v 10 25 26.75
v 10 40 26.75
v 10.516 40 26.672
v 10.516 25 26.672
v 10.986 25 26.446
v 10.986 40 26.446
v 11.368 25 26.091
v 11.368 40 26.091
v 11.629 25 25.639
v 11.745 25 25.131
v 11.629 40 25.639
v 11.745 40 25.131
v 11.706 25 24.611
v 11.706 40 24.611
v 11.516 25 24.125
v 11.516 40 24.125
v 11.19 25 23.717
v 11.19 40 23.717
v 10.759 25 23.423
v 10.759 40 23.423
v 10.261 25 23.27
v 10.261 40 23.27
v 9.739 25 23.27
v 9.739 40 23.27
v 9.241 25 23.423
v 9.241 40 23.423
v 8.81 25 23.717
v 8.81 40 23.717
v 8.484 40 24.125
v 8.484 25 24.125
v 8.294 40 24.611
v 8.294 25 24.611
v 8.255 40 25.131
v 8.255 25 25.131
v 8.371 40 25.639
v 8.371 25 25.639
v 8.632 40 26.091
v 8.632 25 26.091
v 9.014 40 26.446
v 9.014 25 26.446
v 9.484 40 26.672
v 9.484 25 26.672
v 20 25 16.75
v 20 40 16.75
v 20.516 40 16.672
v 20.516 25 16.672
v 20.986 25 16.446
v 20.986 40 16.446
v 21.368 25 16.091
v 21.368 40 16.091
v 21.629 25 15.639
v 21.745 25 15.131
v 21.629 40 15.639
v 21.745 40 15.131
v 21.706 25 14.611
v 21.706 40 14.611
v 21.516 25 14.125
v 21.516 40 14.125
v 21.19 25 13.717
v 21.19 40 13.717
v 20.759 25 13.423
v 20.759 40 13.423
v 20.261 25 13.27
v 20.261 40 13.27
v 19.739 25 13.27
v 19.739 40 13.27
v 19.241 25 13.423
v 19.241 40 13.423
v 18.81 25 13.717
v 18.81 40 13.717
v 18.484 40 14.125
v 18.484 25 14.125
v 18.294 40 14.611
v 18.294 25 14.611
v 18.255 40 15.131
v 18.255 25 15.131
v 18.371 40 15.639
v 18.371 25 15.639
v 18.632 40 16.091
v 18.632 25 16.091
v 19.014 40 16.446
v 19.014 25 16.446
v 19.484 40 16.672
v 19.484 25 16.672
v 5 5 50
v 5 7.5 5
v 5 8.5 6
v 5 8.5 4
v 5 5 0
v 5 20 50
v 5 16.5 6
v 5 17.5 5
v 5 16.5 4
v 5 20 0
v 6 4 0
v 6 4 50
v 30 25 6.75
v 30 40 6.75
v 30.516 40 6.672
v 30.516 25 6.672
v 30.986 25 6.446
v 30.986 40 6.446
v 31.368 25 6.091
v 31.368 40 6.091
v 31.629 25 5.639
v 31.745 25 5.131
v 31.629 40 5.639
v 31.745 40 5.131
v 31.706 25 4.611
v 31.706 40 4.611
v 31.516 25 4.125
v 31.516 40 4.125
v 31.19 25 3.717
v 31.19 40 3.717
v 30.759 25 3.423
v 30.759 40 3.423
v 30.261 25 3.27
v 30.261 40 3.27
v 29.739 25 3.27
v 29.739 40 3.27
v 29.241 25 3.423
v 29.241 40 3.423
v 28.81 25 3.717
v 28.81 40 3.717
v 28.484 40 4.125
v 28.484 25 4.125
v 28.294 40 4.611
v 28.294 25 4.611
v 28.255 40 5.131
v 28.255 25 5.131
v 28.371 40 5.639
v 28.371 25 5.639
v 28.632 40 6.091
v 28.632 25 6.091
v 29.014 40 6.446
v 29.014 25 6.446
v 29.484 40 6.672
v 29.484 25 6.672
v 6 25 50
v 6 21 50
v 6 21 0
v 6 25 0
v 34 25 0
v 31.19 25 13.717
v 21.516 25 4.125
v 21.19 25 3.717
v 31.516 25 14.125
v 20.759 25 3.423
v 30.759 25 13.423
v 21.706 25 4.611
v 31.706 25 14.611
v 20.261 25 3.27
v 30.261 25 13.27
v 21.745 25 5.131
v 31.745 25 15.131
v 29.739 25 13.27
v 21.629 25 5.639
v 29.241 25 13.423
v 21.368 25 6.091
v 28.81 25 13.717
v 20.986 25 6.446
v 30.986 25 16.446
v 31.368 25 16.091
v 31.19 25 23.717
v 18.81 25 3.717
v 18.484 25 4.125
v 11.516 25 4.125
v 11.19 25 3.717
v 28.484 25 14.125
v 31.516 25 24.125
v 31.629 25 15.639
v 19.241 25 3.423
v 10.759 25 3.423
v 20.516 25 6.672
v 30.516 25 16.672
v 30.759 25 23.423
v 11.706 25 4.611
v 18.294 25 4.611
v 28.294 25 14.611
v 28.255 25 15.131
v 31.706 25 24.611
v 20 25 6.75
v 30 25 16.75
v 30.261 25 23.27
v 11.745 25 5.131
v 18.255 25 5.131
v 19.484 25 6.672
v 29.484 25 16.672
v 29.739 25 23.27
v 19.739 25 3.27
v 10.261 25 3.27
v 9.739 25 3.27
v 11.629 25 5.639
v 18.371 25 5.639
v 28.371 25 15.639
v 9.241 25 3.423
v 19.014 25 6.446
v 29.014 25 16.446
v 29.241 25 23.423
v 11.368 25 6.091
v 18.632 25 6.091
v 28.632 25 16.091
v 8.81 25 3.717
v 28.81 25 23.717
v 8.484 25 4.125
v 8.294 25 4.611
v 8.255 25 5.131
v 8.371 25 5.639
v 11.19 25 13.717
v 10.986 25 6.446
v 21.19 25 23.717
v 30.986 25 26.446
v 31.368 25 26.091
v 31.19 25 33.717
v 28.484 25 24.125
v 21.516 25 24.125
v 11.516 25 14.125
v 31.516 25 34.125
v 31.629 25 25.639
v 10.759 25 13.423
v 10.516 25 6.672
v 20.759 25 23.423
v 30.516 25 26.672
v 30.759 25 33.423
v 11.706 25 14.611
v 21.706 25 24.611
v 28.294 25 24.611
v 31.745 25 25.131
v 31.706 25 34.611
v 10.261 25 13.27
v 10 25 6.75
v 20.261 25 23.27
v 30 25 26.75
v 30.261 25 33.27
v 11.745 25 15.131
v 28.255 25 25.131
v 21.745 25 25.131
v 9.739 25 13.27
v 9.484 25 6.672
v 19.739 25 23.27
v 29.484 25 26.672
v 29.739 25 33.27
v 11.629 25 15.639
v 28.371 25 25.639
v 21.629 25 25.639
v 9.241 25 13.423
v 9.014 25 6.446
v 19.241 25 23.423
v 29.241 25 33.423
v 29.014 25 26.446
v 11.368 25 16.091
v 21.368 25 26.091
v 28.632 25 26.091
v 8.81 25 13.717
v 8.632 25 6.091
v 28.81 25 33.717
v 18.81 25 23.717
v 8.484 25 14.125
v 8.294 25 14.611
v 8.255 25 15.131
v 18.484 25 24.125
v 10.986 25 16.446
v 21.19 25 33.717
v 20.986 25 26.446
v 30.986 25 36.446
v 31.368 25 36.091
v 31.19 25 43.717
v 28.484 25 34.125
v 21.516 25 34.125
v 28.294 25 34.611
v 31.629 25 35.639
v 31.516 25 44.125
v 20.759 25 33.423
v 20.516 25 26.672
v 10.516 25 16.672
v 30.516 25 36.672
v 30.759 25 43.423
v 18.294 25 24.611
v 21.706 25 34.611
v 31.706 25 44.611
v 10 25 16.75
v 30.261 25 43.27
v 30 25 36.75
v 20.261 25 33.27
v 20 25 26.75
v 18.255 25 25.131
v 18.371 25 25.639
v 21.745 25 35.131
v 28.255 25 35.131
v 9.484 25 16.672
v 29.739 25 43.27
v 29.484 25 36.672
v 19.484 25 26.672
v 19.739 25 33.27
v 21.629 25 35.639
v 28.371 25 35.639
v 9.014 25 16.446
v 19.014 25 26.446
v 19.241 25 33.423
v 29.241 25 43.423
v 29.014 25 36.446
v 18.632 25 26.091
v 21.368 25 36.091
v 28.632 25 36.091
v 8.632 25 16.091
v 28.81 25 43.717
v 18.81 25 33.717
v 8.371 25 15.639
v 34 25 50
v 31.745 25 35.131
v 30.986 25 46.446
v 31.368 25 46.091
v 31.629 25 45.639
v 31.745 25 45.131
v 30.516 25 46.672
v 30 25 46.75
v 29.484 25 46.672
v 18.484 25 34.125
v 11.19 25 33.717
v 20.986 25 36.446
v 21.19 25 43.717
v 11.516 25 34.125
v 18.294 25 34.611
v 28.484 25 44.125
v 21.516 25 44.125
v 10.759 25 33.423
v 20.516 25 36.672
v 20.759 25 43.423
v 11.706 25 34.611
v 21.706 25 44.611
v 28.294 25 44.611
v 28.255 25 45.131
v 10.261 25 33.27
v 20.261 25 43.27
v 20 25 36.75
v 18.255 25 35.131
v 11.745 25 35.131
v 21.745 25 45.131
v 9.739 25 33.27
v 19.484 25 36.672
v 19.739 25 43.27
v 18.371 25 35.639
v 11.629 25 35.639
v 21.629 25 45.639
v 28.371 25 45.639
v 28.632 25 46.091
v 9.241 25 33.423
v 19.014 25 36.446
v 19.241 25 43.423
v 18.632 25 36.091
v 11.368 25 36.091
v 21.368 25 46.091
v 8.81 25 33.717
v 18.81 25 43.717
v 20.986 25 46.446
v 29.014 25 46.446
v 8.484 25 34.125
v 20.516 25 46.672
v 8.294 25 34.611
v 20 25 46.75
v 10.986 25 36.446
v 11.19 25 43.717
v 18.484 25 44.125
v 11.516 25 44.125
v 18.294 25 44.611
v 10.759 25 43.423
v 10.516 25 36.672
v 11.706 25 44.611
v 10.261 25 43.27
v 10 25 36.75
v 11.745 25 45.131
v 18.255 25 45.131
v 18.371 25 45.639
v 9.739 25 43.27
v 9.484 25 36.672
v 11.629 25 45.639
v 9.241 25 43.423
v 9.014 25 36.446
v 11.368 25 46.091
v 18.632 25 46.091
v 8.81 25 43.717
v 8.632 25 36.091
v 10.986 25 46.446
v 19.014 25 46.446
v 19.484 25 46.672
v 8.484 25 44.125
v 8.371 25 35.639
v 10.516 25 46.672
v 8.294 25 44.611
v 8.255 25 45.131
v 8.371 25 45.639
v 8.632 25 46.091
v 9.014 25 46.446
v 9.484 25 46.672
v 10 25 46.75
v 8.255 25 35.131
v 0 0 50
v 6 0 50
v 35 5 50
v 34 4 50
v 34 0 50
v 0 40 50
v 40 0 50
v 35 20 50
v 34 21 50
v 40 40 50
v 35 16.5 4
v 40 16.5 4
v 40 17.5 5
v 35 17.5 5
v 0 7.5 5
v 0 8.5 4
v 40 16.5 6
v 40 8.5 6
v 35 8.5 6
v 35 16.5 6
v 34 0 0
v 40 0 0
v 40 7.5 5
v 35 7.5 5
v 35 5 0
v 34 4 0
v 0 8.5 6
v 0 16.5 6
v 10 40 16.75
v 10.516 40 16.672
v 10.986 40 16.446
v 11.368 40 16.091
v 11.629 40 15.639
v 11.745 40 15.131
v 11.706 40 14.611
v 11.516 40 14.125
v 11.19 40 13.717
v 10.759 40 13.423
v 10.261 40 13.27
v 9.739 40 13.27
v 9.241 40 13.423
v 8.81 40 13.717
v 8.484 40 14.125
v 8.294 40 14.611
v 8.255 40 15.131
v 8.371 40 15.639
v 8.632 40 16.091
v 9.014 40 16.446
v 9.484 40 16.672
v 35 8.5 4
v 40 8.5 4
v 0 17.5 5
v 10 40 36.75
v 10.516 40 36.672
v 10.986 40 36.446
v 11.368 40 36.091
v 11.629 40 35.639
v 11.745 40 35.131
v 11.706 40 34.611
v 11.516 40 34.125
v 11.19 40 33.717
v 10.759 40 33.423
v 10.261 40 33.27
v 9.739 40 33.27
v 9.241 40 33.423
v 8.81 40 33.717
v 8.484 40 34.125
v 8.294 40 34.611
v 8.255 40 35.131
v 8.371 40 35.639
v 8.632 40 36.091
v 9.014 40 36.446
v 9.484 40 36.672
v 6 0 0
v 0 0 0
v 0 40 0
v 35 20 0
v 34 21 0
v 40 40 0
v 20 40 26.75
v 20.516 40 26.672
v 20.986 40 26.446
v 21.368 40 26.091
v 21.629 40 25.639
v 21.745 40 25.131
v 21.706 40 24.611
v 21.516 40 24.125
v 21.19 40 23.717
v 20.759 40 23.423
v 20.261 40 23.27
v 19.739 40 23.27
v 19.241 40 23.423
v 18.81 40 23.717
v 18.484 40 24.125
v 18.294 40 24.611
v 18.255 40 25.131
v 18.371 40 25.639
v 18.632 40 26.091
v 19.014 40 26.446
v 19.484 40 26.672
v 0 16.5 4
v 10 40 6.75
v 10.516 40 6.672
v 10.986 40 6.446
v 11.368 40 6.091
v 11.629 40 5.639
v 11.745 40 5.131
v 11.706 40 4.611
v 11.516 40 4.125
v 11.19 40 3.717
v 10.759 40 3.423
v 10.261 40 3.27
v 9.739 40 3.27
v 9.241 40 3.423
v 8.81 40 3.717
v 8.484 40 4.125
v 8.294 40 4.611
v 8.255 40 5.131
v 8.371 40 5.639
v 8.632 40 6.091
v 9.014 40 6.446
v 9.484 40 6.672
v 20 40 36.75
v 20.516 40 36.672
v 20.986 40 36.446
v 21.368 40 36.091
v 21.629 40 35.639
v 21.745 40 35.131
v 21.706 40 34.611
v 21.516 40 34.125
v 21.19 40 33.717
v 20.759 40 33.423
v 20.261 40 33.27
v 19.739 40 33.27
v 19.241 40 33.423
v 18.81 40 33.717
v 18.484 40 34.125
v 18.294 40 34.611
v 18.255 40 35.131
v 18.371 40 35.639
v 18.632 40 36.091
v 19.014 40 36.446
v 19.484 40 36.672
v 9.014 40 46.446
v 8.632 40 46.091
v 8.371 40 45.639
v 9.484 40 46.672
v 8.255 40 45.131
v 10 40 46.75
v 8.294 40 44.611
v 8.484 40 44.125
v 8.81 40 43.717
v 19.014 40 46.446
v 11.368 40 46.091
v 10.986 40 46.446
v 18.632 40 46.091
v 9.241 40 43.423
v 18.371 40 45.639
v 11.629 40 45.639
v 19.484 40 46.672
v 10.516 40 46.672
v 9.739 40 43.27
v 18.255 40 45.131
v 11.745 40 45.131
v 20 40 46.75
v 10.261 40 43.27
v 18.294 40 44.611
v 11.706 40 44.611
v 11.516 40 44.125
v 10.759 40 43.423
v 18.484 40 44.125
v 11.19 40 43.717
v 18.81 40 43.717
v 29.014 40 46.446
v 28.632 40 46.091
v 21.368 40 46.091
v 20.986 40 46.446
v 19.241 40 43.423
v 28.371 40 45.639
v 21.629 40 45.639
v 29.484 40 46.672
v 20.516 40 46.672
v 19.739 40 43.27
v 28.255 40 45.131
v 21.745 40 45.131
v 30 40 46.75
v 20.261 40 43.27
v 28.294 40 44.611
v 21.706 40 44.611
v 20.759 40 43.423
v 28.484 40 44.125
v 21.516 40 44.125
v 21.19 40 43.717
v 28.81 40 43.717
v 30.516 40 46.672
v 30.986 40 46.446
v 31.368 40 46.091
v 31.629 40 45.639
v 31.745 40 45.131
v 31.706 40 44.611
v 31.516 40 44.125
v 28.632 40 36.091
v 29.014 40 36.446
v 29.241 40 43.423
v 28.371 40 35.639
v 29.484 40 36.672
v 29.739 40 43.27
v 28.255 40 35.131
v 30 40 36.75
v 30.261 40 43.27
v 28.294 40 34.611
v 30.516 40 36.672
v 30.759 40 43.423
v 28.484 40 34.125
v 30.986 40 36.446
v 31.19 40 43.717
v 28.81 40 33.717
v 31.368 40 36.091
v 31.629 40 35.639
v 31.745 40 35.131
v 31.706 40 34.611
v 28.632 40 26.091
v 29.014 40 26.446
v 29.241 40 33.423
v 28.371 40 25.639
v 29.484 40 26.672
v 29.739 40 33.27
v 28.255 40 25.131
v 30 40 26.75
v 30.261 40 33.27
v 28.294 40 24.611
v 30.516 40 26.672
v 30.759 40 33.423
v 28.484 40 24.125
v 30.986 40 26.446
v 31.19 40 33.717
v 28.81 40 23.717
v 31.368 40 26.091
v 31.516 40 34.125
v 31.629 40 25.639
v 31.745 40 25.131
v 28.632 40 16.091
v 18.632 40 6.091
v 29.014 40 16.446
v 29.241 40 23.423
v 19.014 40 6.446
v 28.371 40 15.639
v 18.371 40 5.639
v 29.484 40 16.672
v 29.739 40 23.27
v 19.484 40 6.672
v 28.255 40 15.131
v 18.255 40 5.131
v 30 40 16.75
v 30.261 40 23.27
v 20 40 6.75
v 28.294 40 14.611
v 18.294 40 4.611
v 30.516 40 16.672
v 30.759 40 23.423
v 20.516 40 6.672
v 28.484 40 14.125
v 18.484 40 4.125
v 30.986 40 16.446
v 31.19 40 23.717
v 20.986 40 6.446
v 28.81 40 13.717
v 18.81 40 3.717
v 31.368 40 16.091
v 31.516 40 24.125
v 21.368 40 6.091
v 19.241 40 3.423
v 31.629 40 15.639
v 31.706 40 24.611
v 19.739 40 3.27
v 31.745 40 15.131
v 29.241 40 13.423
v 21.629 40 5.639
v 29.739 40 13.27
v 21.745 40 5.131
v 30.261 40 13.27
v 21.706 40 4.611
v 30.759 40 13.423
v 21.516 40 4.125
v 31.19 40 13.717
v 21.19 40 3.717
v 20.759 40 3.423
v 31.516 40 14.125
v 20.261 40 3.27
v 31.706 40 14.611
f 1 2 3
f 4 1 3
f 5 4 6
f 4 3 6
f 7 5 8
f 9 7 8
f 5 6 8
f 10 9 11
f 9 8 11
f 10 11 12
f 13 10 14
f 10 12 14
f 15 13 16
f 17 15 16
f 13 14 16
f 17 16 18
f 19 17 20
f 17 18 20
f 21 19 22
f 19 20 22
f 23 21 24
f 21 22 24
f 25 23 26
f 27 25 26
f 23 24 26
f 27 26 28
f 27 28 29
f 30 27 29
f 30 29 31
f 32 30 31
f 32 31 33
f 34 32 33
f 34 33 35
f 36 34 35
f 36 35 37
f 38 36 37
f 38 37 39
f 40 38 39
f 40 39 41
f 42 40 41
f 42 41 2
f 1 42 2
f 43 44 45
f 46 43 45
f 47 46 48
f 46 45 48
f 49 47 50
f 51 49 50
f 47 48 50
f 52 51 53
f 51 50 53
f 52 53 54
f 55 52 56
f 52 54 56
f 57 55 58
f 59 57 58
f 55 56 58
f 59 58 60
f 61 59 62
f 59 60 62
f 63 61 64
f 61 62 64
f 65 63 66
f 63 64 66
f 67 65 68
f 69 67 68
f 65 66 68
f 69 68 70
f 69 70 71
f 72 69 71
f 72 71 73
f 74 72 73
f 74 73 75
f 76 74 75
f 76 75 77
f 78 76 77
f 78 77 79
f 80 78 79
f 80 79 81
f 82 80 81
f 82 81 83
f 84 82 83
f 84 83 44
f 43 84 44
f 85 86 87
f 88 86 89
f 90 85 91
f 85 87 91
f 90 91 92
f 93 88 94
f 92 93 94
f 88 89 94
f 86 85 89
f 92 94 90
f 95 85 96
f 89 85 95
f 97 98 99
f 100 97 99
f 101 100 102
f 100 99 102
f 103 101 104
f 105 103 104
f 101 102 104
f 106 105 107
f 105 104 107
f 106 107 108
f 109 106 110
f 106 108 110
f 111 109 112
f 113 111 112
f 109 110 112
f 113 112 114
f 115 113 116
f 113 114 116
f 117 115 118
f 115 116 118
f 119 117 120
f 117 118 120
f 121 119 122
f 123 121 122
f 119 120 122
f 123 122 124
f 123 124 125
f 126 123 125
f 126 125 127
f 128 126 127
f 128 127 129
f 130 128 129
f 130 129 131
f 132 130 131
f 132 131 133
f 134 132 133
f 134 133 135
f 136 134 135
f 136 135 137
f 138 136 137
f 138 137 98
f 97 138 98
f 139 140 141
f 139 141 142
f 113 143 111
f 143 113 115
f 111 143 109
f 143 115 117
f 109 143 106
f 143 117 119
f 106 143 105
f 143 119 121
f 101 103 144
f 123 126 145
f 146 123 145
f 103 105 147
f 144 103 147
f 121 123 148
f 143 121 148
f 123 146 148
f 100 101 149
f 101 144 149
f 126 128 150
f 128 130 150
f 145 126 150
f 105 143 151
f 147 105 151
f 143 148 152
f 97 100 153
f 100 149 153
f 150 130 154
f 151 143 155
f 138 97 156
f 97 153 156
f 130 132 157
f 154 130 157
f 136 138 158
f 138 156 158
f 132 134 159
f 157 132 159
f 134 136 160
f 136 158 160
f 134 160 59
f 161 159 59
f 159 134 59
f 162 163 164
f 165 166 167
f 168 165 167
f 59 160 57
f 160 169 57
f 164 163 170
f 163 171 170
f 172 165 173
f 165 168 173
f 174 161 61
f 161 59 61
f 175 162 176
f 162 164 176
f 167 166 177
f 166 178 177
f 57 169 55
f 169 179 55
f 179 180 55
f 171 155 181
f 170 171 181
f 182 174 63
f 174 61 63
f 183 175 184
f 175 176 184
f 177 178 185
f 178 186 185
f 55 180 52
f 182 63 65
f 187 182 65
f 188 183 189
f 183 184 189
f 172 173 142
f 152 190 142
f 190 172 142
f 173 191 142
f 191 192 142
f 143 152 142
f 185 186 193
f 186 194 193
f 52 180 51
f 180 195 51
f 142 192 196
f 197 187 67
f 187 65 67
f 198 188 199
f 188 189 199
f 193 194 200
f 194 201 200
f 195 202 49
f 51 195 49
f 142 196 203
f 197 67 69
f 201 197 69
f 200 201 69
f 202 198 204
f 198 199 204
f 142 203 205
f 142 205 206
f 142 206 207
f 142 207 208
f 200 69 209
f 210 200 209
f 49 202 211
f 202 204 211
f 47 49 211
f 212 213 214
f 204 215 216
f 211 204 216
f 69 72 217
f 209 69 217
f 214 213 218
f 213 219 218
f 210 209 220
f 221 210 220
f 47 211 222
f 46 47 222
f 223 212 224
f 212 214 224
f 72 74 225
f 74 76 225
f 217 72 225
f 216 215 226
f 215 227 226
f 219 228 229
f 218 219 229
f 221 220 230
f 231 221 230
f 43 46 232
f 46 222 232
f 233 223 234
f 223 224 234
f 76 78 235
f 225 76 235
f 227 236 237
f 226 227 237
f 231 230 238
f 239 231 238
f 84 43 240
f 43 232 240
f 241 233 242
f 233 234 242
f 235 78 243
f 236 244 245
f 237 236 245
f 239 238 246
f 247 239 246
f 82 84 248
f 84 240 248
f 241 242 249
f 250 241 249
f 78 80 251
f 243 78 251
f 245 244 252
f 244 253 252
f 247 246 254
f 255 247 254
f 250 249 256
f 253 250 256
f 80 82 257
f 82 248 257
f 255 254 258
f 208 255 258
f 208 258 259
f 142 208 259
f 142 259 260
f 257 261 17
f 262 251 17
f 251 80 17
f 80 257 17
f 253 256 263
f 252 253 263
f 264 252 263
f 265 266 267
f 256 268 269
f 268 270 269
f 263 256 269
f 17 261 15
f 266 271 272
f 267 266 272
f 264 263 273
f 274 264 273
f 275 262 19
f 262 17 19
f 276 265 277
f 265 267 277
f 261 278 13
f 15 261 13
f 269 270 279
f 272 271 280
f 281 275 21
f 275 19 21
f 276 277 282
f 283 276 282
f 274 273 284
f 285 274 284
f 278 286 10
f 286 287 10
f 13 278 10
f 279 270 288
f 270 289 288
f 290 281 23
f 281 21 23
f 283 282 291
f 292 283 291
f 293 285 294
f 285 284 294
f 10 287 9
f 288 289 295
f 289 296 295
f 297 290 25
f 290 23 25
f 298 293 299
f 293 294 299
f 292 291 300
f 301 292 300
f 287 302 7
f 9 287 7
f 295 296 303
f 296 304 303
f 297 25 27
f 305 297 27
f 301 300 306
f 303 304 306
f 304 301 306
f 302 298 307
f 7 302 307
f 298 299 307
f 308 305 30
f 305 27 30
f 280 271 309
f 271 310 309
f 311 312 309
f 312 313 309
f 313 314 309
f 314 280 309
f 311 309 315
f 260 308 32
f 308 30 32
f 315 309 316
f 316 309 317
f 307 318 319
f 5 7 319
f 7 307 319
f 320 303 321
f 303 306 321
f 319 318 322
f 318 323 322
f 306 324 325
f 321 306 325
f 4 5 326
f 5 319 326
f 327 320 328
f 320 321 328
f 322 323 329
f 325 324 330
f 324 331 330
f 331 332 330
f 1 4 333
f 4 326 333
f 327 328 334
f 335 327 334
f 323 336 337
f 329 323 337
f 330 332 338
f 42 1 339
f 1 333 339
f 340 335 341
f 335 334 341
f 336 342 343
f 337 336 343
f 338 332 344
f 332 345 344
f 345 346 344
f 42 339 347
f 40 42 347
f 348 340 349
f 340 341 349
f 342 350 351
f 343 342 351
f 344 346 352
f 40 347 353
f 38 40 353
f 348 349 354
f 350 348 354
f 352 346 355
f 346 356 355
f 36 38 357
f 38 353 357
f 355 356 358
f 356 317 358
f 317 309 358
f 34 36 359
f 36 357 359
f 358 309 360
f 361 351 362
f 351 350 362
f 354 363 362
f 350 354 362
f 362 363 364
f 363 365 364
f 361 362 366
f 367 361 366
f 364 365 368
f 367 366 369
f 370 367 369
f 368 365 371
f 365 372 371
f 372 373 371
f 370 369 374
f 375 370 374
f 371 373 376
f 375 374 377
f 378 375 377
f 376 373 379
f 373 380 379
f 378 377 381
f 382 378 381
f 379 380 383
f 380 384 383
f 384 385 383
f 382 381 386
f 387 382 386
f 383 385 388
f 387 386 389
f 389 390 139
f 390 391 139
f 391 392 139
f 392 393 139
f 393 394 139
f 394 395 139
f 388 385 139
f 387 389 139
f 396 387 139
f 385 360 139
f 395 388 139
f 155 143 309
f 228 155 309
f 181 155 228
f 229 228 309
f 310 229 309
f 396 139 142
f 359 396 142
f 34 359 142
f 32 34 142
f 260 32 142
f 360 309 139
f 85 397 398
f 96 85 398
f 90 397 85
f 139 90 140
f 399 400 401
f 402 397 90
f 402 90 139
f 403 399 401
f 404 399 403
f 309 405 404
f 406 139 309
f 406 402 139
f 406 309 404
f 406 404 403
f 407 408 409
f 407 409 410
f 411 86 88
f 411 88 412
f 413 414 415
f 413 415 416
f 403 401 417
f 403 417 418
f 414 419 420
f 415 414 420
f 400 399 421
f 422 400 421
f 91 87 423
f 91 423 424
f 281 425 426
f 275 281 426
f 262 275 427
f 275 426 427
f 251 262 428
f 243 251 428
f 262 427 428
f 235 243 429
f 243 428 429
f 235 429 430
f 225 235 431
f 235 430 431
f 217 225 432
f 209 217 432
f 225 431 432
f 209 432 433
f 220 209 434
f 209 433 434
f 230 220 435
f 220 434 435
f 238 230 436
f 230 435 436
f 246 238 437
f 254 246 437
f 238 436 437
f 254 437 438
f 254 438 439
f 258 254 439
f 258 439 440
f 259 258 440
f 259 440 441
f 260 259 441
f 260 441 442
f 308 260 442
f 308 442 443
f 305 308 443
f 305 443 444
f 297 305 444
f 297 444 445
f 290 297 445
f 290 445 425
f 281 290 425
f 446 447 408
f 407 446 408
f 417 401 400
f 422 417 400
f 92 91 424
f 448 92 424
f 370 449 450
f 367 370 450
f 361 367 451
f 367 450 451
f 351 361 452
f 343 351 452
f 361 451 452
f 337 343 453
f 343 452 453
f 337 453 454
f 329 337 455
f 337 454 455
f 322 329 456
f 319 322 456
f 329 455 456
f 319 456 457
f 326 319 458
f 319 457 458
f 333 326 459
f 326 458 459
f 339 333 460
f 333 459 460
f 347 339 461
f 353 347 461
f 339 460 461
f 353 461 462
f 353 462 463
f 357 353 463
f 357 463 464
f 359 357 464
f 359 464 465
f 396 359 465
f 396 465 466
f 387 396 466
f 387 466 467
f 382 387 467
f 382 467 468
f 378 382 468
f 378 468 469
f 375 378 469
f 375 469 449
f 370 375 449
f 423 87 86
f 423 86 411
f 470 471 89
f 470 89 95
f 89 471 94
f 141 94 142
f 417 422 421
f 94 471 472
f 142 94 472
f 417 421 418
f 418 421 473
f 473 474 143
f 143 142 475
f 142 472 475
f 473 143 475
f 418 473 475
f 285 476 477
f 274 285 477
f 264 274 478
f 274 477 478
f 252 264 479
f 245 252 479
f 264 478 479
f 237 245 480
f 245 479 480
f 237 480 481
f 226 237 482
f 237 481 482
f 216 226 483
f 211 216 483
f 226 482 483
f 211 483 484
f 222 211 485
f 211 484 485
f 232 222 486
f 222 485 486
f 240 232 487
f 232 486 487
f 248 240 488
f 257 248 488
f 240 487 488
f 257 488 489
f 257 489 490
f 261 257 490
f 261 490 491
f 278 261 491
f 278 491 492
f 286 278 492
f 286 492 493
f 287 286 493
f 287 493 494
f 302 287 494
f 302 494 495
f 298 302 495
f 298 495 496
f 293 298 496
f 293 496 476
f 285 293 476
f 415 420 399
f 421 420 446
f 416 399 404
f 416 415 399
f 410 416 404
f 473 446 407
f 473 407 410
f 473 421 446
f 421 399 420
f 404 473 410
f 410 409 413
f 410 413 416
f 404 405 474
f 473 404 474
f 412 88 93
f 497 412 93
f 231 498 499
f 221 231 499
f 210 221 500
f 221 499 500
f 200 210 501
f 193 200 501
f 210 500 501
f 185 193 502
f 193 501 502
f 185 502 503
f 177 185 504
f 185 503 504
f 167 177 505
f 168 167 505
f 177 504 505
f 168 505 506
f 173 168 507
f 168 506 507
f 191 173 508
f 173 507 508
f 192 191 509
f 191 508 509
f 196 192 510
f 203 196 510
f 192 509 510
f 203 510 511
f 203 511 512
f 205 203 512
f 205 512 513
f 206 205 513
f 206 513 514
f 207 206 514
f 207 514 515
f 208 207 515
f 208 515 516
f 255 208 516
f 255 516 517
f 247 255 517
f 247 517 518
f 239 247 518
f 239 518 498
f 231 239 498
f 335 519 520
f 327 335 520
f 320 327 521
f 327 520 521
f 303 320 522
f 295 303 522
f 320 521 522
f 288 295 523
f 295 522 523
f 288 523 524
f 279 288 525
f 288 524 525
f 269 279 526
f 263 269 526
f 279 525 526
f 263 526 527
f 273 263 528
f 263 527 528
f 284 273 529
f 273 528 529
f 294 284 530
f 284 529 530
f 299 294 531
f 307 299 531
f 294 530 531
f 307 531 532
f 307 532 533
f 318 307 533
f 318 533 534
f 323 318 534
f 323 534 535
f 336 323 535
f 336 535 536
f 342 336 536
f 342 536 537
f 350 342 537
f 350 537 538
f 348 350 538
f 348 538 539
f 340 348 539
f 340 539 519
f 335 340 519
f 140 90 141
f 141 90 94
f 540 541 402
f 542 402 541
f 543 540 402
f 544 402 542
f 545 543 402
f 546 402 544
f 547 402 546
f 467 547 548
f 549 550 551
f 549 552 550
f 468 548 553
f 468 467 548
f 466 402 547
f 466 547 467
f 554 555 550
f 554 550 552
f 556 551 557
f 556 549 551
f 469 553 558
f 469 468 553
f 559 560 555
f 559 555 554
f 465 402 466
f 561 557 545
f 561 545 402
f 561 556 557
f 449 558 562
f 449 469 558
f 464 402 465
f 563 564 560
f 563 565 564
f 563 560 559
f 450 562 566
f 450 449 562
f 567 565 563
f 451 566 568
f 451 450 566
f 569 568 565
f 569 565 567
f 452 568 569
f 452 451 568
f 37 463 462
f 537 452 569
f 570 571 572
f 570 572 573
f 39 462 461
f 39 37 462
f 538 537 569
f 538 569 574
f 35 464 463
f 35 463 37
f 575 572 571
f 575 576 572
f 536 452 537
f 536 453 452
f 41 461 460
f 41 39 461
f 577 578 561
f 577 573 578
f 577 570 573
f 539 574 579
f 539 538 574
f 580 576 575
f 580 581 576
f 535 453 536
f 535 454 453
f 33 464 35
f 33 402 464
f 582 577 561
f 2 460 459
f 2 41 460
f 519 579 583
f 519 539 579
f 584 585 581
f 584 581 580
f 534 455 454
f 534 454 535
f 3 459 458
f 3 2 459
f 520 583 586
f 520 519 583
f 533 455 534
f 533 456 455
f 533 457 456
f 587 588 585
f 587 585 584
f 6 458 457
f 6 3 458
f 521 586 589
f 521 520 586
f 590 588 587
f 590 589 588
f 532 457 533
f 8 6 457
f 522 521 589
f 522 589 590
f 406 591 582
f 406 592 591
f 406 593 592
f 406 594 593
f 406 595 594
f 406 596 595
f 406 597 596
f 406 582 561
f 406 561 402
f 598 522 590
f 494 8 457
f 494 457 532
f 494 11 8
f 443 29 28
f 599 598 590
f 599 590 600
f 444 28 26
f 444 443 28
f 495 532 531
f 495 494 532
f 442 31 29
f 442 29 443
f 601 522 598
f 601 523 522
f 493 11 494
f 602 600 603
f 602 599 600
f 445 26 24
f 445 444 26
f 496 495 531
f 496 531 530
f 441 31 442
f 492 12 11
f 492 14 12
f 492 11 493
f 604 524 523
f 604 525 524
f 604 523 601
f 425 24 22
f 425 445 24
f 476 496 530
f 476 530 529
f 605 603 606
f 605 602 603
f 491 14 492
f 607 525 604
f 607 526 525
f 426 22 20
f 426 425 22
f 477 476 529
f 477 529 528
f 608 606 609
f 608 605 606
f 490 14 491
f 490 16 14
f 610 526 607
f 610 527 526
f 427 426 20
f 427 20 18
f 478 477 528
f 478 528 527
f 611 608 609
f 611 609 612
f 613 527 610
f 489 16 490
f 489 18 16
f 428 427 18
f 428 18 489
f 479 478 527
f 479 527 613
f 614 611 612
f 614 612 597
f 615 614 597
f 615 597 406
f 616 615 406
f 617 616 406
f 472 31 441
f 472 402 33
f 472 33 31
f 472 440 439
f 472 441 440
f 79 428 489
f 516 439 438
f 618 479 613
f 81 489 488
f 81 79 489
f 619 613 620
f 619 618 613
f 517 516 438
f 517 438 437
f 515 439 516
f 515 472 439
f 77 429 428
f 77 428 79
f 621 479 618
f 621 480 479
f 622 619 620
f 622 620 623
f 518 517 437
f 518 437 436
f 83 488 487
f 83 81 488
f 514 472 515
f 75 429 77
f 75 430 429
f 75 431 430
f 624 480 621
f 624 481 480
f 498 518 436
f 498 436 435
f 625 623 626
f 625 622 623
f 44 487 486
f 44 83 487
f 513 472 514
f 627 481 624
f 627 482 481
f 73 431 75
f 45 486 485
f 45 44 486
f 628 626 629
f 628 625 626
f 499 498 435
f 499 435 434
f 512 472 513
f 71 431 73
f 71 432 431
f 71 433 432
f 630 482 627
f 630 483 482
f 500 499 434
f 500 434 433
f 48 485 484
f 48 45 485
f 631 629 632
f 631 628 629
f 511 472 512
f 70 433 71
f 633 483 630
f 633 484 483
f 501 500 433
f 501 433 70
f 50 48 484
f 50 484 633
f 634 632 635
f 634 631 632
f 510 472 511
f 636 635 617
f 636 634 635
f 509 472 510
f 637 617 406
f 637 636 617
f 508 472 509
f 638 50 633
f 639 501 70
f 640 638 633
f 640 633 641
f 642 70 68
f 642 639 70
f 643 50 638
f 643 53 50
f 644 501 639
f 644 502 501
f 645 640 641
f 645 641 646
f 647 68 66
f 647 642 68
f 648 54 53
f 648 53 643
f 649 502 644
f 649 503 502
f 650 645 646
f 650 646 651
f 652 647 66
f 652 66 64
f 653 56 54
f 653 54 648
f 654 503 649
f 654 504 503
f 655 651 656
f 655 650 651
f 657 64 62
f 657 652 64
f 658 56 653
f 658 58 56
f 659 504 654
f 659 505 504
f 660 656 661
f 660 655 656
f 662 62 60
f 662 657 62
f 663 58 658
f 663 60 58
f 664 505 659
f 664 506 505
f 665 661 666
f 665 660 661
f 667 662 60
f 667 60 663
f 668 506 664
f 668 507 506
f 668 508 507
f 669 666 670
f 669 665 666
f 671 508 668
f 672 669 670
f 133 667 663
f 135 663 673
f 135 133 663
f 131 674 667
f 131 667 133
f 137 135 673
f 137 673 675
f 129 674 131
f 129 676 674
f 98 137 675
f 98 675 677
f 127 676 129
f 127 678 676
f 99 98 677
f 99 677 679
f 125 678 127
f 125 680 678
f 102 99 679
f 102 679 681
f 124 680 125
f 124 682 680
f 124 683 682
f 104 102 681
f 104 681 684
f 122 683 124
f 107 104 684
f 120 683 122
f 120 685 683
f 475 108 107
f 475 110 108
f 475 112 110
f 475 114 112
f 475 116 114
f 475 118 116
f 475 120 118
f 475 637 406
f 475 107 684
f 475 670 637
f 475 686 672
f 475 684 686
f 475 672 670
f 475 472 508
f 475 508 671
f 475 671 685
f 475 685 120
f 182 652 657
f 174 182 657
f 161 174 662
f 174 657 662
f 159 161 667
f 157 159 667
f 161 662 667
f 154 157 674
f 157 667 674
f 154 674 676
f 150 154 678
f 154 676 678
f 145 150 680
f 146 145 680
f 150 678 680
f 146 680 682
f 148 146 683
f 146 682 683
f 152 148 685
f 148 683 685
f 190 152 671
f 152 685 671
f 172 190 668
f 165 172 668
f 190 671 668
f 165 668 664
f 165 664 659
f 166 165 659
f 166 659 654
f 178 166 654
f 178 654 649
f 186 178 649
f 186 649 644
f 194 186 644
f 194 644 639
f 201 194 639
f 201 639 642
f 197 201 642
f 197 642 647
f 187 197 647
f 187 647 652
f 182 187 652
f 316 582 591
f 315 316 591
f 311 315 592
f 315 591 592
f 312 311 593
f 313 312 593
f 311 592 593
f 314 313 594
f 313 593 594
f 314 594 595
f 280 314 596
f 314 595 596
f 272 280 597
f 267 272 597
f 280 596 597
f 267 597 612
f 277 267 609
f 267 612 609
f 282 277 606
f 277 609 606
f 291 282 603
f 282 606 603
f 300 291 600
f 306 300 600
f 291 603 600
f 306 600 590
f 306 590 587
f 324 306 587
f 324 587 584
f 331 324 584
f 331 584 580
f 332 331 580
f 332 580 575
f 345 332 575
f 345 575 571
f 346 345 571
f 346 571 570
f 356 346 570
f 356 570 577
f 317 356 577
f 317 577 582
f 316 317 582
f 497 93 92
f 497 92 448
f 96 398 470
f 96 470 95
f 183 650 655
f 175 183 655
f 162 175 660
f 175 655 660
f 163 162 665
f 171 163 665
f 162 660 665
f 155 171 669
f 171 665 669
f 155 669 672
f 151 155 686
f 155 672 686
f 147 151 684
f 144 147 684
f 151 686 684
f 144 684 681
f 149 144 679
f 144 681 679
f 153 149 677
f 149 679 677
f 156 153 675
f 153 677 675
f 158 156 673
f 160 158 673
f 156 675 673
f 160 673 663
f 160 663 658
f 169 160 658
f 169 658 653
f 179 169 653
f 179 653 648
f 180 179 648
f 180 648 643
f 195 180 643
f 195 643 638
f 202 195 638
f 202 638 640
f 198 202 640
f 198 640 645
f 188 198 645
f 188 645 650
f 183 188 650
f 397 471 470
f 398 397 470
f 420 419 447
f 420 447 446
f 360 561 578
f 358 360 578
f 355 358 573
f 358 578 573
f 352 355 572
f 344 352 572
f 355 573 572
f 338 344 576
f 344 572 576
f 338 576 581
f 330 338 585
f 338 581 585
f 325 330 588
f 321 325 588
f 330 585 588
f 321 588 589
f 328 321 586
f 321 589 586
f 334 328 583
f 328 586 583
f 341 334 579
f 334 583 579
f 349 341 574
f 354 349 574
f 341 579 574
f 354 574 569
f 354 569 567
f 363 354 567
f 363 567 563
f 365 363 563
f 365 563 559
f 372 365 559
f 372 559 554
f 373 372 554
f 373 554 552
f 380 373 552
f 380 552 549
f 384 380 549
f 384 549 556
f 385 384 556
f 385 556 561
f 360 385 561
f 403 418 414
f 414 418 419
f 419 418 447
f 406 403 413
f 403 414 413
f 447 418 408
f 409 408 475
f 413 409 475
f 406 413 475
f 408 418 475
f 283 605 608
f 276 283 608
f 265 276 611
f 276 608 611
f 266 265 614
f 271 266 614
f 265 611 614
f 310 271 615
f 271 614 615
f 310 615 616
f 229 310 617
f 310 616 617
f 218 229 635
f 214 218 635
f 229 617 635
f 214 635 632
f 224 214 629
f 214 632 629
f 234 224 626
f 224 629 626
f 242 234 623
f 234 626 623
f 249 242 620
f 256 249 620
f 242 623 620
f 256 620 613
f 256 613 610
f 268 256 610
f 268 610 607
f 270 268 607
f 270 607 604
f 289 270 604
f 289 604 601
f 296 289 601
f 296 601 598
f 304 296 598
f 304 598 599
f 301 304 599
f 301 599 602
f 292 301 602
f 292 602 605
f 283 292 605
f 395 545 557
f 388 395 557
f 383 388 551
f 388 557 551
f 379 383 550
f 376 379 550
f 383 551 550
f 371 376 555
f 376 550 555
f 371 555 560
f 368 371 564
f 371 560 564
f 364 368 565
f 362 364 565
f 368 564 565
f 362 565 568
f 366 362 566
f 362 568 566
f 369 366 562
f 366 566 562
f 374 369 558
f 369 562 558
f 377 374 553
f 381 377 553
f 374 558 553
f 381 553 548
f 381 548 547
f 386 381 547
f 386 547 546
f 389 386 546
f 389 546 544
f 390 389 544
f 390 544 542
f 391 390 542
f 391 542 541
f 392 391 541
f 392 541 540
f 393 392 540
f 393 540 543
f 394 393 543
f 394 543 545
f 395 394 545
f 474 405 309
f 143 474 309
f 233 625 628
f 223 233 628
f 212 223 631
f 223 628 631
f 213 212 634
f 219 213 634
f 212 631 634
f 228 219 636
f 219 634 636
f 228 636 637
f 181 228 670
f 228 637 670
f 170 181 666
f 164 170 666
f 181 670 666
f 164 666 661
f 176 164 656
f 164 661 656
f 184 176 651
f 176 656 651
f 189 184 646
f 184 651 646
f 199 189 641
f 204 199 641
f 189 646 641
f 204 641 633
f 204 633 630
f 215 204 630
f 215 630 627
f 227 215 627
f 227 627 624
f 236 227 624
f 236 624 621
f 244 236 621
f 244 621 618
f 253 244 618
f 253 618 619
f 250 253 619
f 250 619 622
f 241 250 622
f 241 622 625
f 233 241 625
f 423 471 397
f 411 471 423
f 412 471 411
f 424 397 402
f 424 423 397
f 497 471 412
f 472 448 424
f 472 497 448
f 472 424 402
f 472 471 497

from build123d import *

# Parameters (mm, degrees)
SKETCH_1_W          = 40
SKETCH_1_H          = 40
SKETCH_1_W_2        = 30
SKETCH_1_H_2        = 15
EXTRUDE_1_DEPTH     = 50
CUT_EXTRUDE_START   = -50
SKETCH_3_W          = 28
SKETCH_3_H          = 25
CUT_EXTRUDE_1_DEPTH = 50
CHAMFER_1_SIZE      = 1
CUT_EXTRUDE_2_REACH = 77.498
SKETCH_4_R          = 1.75
SKETCH_5_W          = 2
SKETCH_5_H          = 10
CUT_EXTRUDE_4_DEPTH = 76.498344353
CHAMFER_3_SIZE      = 1


with BuildPart() as part:
    # ｽｹｯﾁ1 → ﾎﾞｽ - 押し出し1 (new body)
    with BuildSketch(Plane.XY):
        with Locations((20, 20)):
            Rectangle(SKETCH_1_W, SKETCH_1_H)
        with Locations((20, 12.5)):
            Rectangle(SKETCH_1_W_2, SKETCH_1_H_2, mode=Mode.SUBTRACT)
    extrude(amount=EXTRUDE_1_DEPTH)

    # ｽｹｯﾁ3 → ｶｯﾄ - 押し出し1 (cut)
    with BuildSketch(Plane(origin=(0, 0, 0), x_dir=(-1, 0, 0), z_dir=(0, 0, -1)).offset(CUT_EXTRUDE_START)):
        with Locations((-20, 12.5)):
            Rectangle(SKETCH_3_W, SKETCH_3_H)
    extrude(amount=CUT_EXTRUDE_1_DEPTH, mode=Mode.SUBTRACT)

    # 面取り1
    chamfer_1_edges = [part.edges().sort_by_distance(p)[0] for p in [
        (6, 20, 25),
        (6, 5, 25),
        (34, 5, 25),
        (34, 20, 25),
    ]]
    chamfer(chamfer_1_edges, length=CHAMFER_1_SIZE - 0.0001)  # a hair under: the kernel refuses the full size

    # ｽｹｯﾁ4 → ｶｯﾄ - 押し出し2 (cut, up to next)
    with BuildSketch(Plane(origin=(0, 40, 0), x_dir=(1, 0, 0), z_dir=(0, 1, 0)), mode=Mode.PRIVATE) as cut_extrude_2_sk1:
        with Locations(Location((10, -5, 0), (0, 0, 270))):
            Circle(SKETCH_4_R)
    cut_extrude_2_tool1 = extrude(cut_extrude_2_sk1.sketch, amount=-CUT_EXTRUDE_2_REACH, mode=Mode.PRIVATE) & part.part
    # ｽｹｯﾁ4 → ｶｯﾄ - 押し出し2 (cut, up to next)
    with BuildSketch(Plane(origin=(0, 40, 0), x_dir=(1, 0, 0), z_dir=(0, 1, 0)), mode=Mode.PRIVATE) as cut_extrude_2_sk2:
        with Locations(Location((20, -5, 0), (0, 0, 270))):
            Circle(SKETCH_4_R)
    cut_extrude_2_tool2 = extrude(cut_extrude_2_sk2.sketch, amount=-CUT_EXTRUDE_2_REACH, mode=Mode.PRIVATE) & part.part
    # ｽｹｯﾁ4 → ｶｯﾄ - 押し出し2 (cut, up to next)
    with BuildSketch(Plane(origin=(0, 40, 0), x_dir=(1, 0, 0), z_dir=(0, 1, 0)), mode=Mode.PRIVATE) as cut_extrude_2_sk3:
        with Locations(Location((30, -5, 0), (0, 0, 270))):
            Circle(SKETCH_4_R)
    cut_extrude_2_tool3 = extrude(cut_extrude_2_sk3.sketch, amount=-CUT_EXTRUDE_2_REACH, mode=Mode.PRIVATE) & part.part
    # ｽｹｯﾁ4 → ｶｯﾄ - 押し出し2 (cut, up to next)
    with BuildSketch(Plane(origin=(0, 40, 0), x_dir=(1, 0, 0), z_dir=(0, 1, 0)), mode=Mode.PRIVATE) as cut_extrude_2_sk4:
        with Locations(Location((10, -15, 0), (0, 0, 270))):
            Circle(SKETCH_4_R)
    cut_extrude_2_tool4 = extrude(cut_extrude_2_sk4.sketch, amount=-CUT_EXTRUDE_2_REACH, mode=Mode.PRIVATE) & part.part
    # ｽｹｯﾁ4 → ｶｯﾄ - 押し出し2 (cut, up to next)
    with BuildSketch(Plane(origin=(0, 40, 0), x_dir=(1, 0, 0), z_dir=(0, 1, 0)), mode=Mode.PRIVATE) as cut_extrude_2_sk5:
        with Locations(Location((20, -15, 0), (0, 0, 270))):
            Circle(SKETCH_4_R)
    cut_extrude_2_tool5 = extrude(cut_extrude_2_sk5.sketch, amount=-CUT_EXTRUDE_2_REACH, mode=Mode.PRIVATE) & part.part
    # ｽｹｯﾁ4 → ｶｯﾄ - 押し出し2 (cut, up to next)
    with BuildSketch(Plane(origin=(0, 40, 0), x_dir=(1, 0, 0), z_dir=(0, 1, 0)), mode=Mode.PRIVATE) as cut_extrude_2_sk6:
        with Locations(Location((30, -15, 0), (0, 0, 270))):
            Circle(SKETCH_4_R)
    cut_extrude_2_tool6 = extrude(cut_extrude_2_sk6.sketch, amount=-CUT_EXTRUDE_2_REACH, mode=Mode.PRIVATE) & part.part
    # ｽｹｯﾁ4 → ｶｯﾄ - 押し出し2 (cut, up to next)
    with BuildSketch(Plane(origin=(0, 40, 0), x_dir=(1, 0, 0), z_dir=(0, 1, 0)), mode=Mode.PRIVATE) as cut_extrude_2_sk7:
        with Locations(Location((10, -25, 0), (0, 0, 270))):
            Circle(SKETCH_4_R)
    cut_extrude_2_tool7 = extrude(cut_extrude_2_sk7.sketch, amount=-CUT_EXTRUDE_2_REACH, mode=Mode.PRIVATE) & part.part
    # ｽｹｯﾁ4 → ｶｯﾄ - 押し出し2 (cut, up to next)
    with BuildSketch(Plane(origin=(0, 40, 0), x_dir=(1, 0, 0), z_dir=(0, 1, 0)), mode=Mode.PRIVATE) as cut_extrude_2_sk8:
        with Locations(Location((20, -25, 0), (0, 0, 270))):
            Circle(SKETCH_4_R)
    cut_extrude_2_tool8 = extrude(cut_extrude_2_sk8.sketch, amount=-CUT_EXTRUDE_2_REACH, mode=Mode.PRIVATE) & part.part
    # ｽｹｯﾁ4 → ｶｯﾄ - 押し出し2 (cut, up to next)
    with BuildSketch(Plane(origin=(0, 40, 0), x_dir=(1, 0, 0), z_dir=(0, 1, 0)), mode=Mode.PRIVATE) as cut_extrude_2_sk9:
        with Locations(Location((30, -25, 0), (0, 0, 270))):
            Circle(SKETCH_4_R)
    cut_extrude_2_tool9 = extrude(cut_extrude_2_sk9.sketch, amount=-CUT_EXTRUDE_2_REACH, mode=Mode.PRIVATE) & part.part
    # ｽｹｯﾁ4 → ｶｯﾄ - 押し出し2 (cut, up to next)
    with BuildSketch(Plane(origin=(0, 40, 0), x_dir=(1, 0, 0), z_dir=(0, 1, 0)), mode=Mode.PRIVATE) as cut_extrude_2_sk10:
        with Locations(Location((10, -35, 0), (0, 0, 270))):
            Circle(SKETCH_4_R)
    cut_extrude_2_tool10 = extrude(cut_extrude_2_sk10.sketch, amount=-CUT_EXTRUDE_2_REACH, mode=Mode.PRIVATE) & part.part
    # ｽｹｯﾁ4 → ｶｯﾄ - 押し出し2 (cut, up to next)
    with BuildSketch(Plane(origin=(0, 40, 0), x_dir=(1, 0, 0), z_dir=(0, 1, 0)), mode=Mode.PRIVATE) as cut_extrude_2_sk11:
        with Locations(Location((20, -35, 0), (0, 0, 270))):
            Circle(SKETCH_4_R)
    cut_extrude_2_tool11 = extrude(cut_extrude_2_sk11.sketch, amount=-CUT_EXTRUDE_2_REACH, mode=Mode.PRIVATE) & part.part
    # ｽｹｯﾁ4 → ｶｯﾄ - 押し出し2 (cut, up to next)
    with BuildSketch(Plane(origin=(0, 40, 0), x_dir=(1, 0, 0), z_dir=(0, 1, 0)), mode=Mode.PRIVATE) as cut_extrude_2_sk12:
        with Locations(Location((30, -35, 0), (0, 0, 270))):
            Circle(SKETCH_4_R)
    cut_extrude_2_tool12 = extrude(cut_extrude_2_sk12.sketch, amount=-CUT_EXTRUDE_2_REACH, mode=Mode.PRIVATE) & part.part
    # ｽｹｯﾁ4 → ｶｯﾄ - 押し出し2 (cut, up to next)
    with BuildSketch(Plane(origin=(0, 40, 0), x_dir=(1, 0, 0), z_dir=(0, 1, 0)), mode=Mode.PRIVATE) as cut_extrude_2_sk13:
        with Locations(Location((10, -45, 0), (0, 0, 270))):
            Circle(SKETCH_4_R)
    cut_extrude_2_tool13 = extrude(cut_extrude_2_sk13.sketch, amount=-CUT_EXTRUDE_2_REACH, mode=Mode.PRIVATE) & part.part
    # ｽｹｯﾁ4 → ｶｯﾄ - 押し出し2 (cut, up to next)
    with BuildSketch(Plane(origin=(0, 40, 0), x_dir=(1, 0, 0), z_dir=(0, 1, 0)), mode=Mode.PRIVATE) as cut_extrude_2_sk14:
        with Locations(Location((20, -45, 0), (0, 0, 270))):
            Circle(SKETCH_4_R)
    cut_extrude_2_tool14 = extrude(cut_extrude_2_sk14.sketch, amount=-CUT_EXTRUDE_2_REACH, mode=Mode.PRIVATE) & part.part
    # ｽｹｯﾁ4 → ｶｯﾄ - 押し出し2 (cut, up to next)
    with BuildSketch(Plane(origin=(0, 40, 0), x_dir=(1, 0, 0), z_dir=(0, 1, 0)), mode=Mode.PRIVATE) as cut_extrude_2_sk15:
        with Locations(Location((30, -45, 0), (0, 0, 270))):
            Circle(SKETCH_4_R)
    cut_extrude_2_tool15 = extrude(cut_extrude_2_sk15.sketch, amount=-CUT_EXTRUDE_2_REACH, mode=Mode.PRIVATE) & part.part
    add(cut_extrude_2_tool1.solids().sort_by_distance((10, 40, 5))[0], mode=Mode.SUBTRACT)
    add(cut_extrude_2_tool2.solids().sort_by_distance((20, 40, 5))[0], mode=Mode.SUBTRACT)
    add(cut_extrude_2_tool3.solids().sort_by_distance((30, 40, 5))[0], mode=Mode.SUBTRACT)
    add(cut_extrude_2_tool4.solids().sort_by_distance((10, 40, 15))[0], mode=Mode.SUBTRACT)
    add(cut_extrude_2_tool5.solids().sort_by_distance((20, 40, 15))[0], mode=Mode.SUBTRACT)
    add(cut_extrude_2_tool6.solids().sort_by_distance((30, 40, 15))[0], mode=Mode.SUBTRACT)
    add(cut_extrude_2_tool7.solids().sort_by_distance((10, 40, 25))[0], mode=Mode.SUBTRACT)
    add(cut_extrude_2_tool8.solids().sort_by_distance((20, 40, 25))[0], mode=Mode.SUBTRACT)
    add(cut_extrude_2_tool9.solids().sort_by_distance((30, 40, 25))[0], mode=Mode.SUBTRACT)
    add(cut_extrude_2_tool10.solids().sort_by_distance((10, 40, 35))[0], mode=Mode.SUBTRACT)
    add(cut_extrude_2_tool11.solids().sort_by_distance((20, 40, 35))[0], mode=Mode.SUBTRACT)
    add(cut_extrude_2_tool12.solids().sort_by_distance((30, 40, 35))[0], mode=Mode.SUBTRACT)
    add(cut_extrude_2_tool13.solids().sort_by_distance((10, 40, 45))[0], mode=Mode.SUBTRACT)
    add(cut_extrude_2_tool14.solids().sort_by_distance((20, 40, 45))[0], mode=Mode.SUBTRACT)
    add(cut_extrude_2_tool15.solids().sort_by_distance((30, 40, 45))[0], mode=Mode.SUBTRACT)

    # ｽｹｯﾁ5 → ｶｯﾄ - 押し出し4 (cut, through all)
    with BuildSketch(Plane(origin=(40, 0, 0), x_dir=(0, 0, -1), z_dir=(1, 0, 0))):
        with Locations((-5, 12.5)):
            Rectangle(SKETCH_5_W, SKETCH_5_H)
    extrude(amount=-CUT_EXTRUDE_4_DEPTH, mode=Mode.SUBTRACT)

    # 面取り3
    chamfer_3_edges = [part.edges().sort_by_distance(p)[0] for p in [
        (2.5, 17.5, 6),
        (2.5, 17.5, 4),
        (2.5, 7.5, 4),
        (2.5, 7.5, 6),
        (37.5, 7.5, 4),
        (37.5, 7.5, 6),
        (37.5, 17.5, 4),
        (37.5, 17.5, 6),
    ]]
    chamfer(chamfer_3_edges, length=CHAMFER_3_SIZE - 0.0001)  # a hair under: the kernel refuses the full size


solid = part.part
